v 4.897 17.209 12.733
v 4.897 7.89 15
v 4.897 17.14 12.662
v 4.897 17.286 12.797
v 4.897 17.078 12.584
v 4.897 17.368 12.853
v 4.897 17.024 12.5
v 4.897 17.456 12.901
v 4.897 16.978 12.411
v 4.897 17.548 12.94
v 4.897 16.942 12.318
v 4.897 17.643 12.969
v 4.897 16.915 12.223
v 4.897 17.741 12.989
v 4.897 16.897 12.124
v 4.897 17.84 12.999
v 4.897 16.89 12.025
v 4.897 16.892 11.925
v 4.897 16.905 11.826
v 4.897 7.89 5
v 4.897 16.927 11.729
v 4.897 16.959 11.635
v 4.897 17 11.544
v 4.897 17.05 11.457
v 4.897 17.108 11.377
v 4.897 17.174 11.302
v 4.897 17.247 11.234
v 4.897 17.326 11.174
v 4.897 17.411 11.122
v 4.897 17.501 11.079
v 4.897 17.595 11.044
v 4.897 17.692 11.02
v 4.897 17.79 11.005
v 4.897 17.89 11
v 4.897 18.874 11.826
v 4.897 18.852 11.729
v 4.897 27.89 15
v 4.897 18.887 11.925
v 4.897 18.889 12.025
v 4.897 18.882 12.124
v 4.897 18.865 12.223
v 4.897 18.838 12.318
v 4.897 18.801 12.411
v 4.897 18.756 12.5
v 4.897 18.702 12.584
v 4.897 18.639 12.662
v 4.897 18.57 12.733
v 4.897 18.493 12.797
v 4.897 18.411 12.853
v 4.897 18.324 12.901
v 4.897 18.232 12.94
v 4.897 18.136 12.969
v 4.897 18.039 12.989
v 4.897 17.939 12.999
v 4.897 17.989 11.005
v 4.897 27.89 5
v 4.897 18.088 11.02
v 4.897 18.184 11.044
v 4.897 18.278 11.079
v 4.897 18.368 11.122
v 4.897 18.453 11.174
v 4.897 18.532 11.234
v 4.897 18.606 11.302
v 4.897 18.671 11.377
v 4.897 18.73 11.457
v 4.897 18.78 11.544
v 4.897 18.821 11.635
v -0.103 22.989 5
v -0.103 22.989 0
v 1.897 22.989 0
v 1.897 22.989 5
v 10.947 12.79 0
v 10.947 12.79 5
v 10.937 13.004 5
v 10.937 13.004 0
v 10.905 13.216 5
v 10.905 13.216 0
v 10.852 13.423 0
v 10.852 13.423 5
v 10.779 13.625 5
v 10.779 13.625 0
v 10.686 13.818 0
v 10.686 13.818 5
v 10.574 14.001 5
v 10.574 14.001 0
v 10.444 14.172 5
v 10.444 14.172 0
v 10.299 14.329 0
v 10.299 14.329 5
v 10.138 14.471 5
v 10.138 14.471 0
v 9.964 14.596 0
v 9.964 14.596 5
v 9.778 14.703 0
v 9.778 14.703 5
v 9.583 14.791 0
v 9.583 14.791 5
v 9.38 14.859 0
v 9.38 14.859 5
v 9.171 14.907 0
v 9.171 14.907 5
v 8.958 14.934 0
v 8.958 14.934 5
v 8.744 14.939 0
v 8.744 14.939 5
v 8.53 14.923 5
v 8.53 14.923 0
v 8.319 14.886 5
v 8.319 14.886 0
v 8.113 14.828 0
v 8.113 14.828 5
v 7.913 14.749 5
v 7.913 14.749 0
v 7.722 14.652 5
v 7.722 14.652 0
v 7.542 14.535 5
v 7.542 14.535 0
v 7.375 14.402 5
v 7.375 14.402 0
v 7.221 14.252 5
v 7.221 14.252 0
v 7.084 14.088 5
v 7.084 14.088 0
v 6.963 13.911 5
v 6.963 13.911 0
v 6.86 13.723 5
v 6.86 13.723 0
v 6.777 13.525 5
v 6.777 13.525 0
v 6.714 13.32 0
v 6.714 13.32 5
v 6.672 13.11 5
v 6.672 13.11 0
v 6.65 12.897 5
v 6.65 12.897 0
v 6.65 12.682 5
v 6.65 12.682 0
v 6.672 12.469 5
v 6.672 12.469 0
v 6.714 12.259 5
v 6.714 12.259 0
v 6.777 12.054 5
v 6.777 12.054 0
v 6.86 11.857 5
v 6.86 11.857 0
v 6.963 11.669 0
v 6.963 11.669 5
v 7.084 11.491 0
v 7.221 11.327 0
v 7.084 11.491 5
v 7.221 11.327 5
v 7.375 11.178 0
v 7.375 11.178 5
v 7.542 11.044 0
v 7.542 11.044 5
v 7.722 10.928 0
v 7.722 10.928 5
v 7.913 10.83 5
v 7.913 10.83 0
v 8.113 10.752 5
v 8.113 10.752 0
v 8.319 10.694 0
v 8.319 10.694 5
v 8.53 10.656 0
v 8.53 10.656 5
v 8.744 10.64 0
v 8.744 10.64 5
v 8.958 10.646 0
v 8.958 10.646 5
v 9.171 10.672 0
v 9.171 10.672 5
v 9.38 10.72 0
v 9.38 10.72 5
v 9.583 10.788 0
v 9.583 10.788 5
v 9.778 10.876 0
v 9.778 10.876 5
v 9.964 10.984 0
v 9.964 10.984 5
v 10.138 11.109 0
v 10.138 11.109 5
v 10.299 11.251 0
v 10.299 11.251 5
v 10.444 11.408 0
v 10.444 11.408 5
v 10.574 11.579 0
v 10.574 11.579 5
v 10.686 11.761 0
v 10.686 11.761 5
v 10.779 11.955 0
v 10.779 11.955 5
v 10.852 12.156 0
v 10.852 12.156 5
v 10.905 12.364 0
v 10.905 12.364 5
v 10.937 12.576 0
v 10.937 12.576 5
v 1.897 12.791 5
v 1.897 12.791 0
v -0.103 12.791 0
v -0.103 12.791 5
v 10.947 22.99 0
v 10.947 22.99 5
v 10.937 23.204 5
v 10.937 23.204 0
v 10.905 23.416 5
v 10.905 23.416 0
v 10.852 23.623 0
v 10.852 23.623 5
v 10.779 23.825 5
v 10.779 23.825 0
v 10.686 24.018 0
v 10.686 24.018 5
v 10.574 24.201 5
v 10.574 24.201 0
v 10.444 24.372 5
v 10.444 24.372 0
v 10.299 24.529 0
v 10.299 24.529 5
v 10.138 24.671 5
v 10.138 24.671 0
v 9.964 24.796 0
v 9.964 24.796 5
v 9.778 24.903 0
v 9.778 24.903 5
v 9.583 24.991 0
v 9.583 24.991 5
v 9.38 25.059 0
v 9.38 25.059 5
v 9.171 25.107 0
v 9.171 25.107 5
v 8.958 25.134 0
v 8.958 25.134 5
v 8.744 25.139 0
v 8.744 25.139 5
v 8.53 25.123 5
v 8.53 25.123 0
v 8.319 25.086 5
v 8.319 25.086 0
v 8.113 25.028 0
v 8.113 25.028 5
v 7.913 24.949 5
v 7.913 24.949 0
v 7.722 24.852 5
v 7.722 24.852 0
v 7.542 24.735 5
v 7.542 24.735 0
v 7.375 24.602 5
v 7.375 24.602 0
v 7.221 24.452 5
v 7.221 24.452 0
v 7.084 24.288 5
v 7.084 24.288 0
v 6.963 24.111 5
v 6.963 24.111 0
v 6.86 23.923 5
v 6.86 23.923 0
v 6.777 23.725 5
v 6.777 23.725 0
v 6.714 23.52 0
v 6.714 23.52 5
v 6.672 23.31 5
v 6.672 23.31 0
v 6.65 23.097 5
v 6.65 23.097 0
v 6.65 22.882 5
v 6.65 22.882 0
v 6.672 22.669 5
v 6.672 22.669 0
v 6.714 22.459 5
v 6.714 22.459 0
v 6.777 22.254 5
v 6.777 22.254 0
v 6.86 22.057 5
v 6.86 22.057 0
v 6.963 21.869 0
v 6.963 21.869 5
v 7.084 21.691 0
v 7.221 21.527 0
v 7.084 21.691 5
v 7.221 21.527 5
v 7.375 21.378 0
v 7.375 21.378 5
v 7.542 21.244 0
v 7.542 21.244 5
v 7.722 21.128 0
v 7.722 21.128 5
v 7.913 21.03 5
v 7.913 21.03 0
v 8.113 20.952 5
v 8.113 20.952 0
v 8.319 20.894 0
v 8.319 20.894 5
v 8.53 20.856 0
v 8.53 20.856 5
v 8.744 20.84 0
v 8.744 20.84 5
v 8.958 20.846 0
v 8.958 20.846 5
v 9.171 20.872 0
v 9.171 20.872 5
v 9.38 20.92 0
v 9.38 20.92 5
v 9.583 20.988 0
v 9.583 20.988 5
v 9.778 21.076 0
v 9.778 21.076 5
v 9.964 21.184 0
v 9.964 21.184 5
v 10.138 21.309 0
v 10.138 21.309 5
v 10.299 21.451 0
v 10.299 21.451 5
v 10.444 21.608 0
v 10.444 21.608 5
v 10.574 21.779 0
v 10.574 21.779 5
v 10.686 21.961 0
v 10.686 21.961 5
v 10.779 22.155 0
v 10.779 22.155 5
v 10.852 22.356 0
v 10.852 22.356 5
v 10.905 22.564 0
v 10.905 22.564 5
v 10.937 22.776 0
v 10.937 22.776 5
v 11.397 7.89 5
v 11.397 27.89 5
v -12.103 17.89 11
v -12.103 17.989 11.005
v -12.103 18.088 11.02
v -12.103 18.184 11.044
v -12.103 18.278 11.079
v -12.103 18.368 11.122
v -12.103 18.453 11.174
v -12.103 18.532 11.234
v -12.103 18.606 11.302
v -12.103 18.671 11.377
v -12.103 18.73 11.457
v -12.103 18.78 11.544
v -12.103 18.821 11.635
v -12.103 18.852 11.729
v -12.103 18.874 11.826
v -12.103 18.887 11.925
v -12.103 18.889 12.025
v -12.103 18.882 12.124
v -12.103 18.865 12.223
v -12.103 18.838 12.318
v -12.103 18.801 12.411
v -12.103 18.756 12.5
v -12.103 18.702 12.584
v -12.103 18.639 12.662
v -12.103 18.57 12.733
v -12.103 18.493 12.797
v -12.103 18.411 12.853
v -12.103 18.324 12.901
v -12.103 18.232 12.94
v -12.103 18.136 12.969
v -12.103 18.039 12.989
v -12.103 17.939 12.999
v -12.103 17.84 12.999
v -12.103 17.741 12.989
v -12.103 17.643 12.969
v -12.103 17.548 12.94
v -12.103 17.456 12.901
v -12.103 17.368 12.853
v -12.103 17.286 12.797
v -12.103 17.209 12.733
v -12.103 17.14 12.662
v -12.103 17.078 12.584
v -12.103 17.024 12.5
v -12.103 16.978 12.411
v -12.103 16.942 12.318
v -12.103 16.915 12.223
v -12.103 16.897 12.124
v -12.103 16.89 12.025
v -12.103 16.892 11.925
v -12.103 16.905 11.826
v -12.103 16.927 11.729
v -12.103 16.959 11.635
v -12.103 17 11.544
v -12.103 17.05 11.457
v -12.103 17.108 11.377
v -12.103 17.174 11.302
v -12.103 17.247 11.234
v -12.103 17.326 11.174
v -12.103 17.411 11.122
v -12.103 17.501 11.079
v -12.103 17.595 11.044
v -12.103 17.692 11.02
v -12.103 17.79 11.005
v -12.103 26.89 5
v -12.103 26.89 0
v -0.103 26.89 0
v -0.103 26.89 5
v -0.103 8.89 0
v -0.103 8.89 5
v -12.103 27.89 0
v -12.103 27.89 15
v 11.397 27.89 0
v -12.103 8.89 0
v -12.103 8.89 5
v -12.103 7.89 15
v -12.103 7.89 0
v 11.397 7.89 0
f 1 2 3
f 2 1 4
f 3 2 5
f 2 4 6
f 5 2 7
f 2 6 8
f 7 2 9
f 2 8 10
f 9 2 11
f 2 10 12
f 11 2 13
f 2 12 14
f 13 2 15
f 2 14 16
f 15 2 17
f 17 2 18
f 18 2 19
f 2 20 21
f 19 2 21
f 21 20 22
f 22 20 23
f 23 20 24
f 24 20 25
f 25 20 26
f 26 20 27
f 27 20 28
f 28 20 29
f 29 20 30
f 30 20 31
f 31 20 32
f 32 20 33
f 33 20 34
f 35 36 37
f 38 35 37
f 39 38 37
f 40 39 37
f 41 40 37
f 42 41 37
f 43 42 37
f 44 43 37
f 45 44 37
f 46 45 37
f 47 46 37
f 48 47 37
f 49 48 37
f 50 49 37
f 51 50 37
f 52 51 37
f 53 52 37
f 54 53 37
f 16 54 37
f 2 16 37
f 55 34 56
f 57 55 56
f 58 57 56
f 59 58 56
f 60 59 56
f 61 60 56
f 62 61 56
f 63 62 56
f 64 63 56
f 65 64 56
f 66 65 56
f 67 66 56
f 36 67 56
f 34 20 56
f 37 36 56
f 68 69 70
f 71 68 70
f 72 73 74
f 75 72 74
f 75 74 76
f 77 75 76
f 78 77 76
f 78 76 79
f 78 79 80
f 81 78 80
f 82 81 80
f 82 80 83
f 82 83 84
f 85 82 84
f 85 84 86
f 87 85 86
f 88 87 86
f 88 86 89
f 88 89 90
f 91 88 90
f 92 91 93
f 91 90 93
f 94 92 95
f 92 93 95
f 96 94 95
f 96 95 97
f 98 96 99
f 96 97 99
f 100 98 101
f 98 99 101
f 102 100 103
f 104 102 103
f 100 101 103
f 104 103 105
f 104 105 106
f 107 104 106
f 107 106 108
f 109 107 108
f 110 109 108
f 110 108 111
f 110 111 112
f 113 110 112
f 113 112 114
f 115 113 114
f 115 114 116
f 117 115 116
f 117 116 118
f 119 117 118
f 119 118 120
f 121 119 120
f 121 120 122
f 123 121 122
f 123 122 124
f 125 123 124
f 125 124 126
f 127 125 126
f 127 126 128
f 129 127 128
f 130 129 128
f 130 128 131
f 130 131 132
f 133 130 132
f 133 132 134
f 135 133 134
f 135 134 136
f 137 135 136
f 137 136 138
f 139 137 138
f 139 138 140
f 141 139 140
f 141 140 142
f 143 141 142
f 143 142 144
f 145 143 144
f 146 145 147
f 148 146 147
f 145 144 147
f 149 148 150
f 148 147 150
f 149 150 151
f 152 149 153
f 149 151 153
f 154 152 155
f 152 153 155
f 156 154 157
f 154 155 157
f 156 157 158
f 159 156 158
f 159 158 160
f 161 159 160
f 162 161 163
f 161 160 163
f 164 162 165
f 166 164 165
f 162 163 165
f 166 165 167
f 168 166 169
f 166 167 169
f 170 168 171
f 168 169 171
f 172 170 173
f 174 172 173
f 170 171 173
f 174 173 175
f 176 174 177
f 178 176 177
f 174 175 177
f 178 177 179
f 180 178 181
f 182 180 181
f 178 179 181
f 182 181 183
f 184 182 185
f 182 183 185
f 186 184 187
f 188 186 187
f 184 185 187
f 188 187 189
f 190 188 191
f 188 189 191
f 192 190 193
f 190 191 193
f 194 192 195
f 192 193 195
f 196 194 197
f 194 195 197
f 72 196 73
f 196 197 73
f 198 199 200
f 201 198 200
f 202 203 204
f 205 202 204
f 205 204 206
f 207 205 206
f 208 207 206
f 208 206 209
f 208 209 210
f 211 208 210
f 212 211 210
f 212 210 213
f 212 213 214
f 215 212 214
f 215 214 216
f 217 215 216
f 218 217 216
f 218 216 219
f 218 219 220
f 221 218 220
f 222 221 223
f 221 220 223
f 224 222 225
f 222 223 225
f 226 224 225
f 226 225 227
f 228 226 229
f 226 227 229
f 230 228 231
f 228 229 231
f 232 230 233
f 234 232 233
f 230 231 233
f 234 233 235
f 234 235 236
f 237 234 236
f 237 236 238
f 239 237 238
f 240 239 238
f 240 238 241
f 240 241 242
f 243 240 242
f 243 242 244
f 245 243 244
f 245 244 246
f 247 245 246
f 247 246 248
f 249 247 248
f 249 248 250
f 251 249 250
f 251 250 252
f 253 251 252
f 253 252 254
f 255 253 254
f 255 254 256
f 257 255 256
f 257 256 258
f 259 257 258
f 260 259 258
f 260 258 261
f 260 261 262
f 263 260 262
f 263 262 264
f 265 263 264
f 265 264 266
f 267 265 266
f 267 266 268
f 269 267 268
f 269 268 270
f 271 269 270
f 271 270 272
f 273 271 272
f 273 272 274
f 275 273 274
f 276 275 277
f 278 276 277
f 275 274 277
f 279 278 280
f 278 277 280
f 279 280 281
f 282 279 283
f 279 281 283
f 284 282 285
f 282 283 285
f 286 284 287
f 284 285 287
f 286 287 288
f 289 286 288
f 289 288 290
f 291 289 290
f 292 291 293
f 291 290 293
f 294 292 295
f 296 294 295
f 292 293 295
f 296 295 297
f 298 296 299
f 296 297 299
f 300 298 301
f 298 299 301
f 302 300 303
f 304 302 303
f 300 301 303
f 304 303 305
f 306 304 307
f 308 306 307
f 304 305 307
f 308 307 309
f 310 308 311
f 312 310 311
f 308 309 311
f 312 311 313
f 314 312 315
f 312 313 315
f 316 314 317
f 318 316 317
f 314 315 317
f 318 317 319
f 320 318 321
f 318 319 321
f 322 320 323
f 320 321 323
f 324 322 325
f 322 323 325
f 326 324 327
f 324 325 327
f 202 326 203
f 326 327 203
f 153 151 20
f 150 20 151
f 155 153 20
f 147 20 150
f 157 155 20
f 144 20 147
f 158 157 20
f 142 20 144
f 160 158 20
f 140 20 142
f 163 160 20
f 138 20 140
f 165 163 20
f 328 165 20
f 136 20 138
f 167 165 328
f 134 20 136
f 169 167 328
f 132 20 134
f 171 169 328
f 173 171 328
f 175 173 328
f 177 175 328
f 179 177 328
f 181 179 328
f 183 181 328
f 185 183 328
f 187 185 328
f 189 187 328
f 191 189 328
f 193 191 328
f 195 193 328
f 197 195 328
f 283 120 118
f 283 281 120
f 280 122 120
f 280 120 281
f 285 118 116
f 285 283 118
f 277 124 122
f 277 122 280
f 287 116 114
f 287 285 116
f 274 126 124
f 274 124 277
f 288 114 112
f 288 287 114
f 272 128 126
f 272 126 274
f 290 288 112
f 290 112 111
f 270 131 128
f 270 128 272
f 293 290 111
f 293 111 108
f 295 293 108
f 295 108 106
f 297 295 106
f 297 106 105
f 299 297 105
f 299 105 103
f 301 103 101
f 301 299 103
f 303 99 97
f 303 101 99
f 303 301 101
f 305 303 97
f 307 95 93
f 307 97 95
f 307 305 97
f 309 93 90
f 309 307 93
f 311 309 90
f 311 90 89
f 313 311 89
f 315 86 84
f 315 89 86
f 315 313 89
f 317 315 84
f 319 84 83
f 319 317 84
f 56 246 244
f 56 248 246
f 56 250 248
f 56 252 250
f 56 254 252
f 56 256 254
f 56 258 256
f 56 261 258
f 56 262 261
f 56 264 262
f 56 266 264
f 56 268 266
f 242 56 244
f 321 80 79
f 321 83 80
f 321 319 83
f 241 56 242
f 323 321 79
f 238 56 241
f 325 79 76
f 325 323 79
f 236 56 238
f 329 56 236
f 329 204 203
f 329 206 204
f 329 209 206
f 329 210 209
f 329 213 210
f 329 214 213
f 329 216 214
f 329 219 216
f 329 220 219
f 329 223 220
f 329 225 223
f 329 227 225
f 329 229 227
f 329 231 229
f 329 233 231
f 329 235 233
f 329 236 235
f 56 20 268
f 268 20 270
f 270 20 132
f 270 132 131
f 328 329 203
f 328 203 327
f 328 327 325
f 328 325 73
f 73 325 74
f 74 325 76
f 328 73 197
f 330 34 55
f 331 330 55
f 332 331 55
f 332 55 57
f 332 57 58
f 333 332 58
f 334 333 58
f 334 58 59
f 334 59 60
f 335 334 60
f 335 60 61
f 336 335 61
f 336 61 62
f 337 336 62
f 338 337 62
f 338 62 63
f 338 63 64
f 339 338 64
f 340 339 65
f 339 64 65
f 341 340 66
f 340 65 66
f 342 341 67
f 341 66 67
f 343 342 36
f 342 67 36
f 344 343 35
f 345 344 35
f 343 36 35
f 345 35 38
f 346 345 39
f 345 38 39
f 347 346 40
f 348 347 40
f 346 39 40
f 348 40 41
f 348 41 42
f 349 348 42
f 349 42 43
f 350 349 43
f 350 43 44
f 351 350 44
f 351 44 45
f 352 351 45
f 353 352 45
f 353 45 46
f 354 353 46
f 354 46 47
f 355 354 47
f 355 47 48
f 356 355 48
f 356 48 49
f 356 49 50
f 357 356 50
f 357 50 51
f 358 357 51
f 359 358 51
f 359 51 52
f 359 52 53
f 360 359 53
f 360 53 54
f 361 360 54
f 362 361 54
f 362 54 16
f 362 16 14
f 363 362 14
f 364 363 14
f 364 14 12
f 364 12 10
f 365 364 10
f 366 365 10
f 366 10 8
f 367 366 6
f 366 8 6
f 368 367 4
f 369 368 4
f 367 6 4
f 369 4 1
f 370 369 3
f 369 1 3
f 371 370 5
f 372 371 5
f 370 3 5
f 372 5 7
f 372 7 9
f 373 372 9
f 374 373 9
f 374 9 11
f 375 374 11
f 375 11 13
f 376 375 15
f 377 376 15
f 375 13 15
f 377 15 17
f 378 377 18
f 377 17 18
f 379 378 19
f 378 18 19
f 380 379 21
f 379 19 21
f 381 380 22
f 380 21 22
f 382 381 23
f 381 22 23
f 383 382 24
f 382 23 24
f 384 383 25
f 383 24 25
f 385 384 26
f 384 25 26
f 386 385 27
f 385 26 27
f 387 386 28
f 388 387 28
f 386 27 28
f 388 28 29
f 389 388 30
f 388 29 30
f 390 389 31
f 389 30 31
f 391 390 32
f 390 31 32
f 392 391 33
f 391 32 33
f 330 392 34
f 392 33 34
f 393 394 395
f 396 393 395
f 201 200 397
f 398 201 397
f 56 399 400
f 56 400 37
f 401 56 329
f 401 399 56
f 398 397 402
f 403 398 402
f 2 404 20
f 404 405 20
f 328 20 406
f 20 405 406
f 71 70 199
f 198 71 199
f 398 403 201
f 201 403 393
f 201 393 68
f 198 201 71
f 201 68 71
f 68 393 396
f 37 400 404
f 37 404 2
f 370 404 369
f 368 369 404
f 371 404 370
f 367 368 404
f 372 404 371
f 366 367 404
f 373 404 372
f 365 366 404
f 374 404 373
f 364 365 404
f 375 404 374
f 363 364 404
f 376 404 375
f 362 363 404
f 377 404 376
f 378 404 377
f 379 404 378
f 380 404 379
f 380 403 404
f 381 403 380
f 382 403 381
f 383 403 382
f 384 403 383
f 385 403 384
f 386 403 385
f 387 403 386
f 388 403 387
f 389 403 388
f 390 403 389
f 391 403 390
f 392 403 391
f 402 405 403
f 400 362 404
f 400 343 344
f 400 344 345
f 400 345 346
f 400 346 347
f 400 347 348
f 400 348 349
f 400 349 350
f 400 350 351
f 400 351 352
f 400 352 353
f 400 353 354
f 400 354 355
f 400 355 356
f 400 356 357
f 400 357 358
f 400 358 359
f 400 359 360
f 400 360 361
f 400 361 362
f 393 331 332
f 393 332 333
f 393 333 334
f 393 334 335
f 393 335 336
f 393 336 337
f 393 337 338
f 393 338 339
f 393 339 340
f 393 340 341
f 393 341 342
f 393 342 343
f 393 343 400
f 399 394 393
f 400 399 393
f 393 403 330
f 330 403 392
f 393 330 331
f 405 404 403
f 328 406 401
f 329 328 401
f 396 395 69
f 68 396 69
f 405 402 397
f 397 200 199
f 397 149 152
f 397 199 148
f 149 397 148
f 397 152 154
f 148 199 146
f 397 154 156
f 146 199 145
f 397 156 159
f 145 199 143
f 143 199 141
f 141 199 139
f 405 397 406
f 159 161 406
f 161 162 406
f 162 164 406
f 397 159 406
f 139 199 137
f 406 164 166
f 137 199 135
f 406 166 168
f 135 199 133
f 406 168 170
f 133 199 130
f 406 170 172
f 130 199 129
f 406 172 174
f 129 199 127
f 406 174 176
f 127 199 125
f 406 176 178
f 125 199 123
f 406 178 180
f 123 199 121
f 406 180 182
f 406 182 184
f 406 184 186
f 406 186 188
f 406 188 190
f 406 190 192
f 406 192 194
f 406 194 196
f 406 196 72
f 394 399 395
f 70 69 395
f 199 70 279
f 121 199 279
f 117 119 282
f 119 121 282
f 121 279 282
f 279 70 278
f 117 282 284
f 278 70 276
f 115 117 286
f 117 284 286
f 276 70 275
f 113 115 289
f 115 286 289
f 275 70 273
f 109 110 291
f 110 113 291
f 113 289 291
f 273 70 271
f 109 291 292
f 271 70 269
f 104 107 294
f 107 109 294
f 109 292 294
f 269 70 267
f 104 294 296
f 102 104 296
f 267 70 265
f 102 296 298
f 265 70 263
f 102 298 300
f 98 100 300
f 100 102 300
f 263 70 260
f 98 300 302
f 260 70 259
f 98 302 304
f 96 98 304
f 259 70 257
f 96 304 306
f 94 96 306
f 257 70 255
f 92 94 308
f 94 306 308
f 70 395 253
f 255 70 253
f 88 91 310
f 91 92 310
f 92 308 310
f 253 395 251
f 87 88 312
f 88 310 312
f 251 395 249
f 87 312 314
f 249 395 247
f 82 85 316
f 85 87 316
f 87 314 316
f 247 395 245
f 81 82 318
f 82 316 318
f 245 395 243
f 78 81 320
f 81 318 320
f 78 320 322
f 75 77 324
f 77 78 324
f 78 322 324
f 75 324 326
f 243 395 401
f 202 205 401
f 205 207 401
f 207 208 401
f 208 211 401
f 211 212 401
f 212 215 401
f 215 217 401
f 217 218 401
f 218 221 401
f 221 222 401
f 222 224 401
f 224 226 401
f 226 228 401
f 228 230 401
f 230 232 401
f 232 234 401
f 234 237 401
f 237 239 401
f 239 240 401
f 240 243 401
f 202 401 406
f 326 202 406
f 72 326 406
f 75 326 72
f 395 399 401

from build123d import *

# Parameters (mm, degrees)
BOSS_EXTRUDE1_DEPTH = 5
SKETCH2_W           = 17
SKETCH2_H           = 20
BOSS_EXTRUDE2_DEPTH = 10
SKETCH3_R           = 1
CUT_EXTRUDE1_DEPTH  = 18
SKETCH4_R           = 2.15
CUT_EXTRUDE2_DEPTH  = 6


with BuildPart() as part:
    # Sketch1 → Boss-Extrude1 (new body)
    with BuildSketch(Plane.XY):
        Polygon((-12.102505447, 7.889651416), (11.397494553, 7.889651416), (11.397494553, 27.889651416), (-12.102505447, 27.889651416), (-12.102505447, 26.889651416), (-0.102505447, 26.889651416), (-0.102505447, 22.98867093), (1.897494553, 22.98867093), (1.897494553, 12.790631903), (-0.102505447, 12.790631903), (-0.102505447, 8.889651416), (-1.102505447, 8.889651416), (-12.102505447, 8.889651416), align=None)
    extrude(amount=BOSS_EXTRUDE1_DEPTH)

    # Sketch2 → Boss-Extrude2 (add)
    with BuildSketch(Plane.XY.offset(5)):
        with Locations((-3.602505447, 17.889651416)):
            Rectangle(SKETCH2_W, SKETCH2_H)
    extrude(amount=BOSS_EXTRUDE2_DEPTH)

    # Sketch3 → Cut-Extrude1 (cut, through all)
    with BuildSketch(Plane(origin=(4.897494553, 0, 0), x_dir=(0, 0, -1), z_dir=(1, 0, 0))):
        with Locations((-12, 17.889651416)):
            Circle(SKETCH3_R)
    extrude(amount=-CUT_EXTRUDE1_DEPTH, mode=Mode.SUBTRACT)

    # Sketch4 → Cut-Extrude2 (cut, through all)
    with BuildSketch(Plane.XY.offset(5)):
        with Locations((8.797494553, 12.789651416)):
            Circle(SKETCH4_R)
        with Locations((8.797494553, 22.989651416)):
            Circle(SKETCH4_R)
    extrude(amount=-CUT_EXTRUDE2_DEPTH, mode=Mode.SUBTRACT)


solid = part.part
